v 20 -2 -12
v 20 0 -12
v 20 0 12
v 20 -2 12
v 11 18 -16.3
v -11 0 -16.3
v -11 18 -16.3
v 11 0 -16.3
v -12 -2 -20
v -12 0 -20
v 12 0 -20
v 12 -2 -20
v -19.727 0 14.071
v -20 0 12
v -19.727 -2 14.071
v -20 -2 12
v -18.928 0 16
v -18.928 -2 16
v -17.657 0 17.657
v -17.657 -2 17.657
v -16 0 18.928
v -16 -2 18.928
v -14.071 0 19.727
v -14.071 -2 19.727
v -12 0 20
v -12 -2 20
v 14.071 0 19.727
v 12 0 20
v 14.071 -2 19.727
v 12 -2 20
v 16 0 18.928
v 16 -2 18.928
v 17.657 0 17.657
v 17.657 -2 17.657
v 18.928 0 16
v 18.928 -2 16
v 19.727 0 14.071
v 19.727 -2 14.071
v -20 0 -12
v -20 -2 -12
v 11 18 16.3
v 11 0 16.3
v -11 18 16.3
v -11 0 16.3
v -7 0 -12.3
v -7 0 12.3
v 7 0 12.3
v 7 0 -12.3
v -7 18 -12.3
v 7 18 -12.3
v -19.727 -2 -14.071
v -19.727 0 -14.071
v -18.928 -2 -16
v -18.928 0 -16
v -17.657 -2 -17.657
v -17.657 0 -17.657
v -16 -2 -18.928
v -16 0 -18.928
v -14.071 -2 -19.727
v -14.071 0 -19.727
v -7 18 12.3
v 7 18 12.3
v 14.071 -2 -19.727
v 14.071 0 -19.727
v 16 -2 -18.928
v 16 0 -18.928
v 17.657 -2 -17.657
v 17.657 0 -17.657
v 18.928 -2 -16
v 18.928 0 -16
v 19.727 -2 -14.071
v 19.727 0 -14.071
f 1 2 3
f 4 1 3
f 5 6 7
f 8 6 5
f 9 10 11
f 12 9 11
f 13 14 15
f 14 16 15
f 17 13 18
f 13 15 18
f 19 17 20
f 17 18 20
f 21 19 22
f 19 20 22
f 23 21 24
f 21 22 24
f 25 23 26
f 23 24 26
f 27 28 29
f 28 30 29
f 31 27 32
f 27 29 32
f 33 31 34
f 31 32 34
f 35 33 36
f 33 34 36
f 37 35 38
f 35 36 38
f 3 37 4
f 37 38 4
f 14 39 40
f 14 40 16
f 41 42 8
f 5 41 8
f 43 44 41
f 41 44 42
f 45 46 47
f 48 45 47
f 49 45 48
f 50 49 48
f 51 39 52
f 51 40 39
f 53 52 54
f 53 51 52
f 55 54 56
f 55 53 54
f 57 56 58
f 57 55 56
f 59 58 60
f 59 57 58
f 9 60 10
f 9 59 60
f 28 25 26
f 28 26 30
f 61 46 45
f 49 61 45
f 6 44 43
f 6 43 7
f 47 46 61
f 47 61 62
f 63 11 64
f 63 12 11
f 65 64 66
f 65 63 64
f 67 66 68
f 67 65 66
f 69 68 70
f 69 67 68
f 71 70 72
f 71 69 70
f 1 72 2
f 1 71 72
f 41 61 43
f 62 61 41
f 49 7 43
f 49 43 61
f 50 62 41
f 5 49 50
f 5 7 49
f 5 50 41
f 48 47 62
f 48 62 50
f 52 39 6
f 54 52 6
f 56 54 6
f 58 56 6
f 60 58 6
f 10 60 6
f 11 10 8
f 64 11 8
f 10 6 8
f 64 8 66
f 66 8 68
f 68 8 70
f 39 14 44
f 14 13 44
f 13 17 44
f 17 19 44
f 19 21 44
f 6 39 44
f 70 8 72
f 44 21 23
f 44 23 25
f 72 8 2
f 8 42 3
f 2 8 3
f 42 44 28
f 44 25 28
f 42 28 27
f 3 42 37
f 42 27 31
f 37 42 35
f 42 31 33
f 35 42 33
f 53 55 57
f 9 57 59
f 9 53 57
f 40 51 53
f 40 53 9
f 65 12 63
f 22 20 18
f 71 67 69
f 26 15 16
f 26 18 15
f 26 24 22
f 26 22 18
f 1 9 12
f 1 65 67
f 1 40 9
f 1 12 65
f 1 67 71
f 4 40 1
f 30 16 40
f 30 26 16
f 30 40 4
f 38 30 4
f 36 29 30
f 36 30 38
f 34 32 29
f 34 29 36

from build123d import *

# Parameters (mm, degrees)
SKETCH1_W           = 22
SKETCH1_H           = 32.6
SKETCH1_W_2         = 14
SKETCH1_H_2         = 24.6
BOSS_EXTRUDE1_DEPTH = 18
SKETCH3_W           = 40
SKETCH3_H           = 40
BOSS_EXTRUDE2_DEPTH = 2
FILLET1_R           = 8


with BuildPart() as part:
    # Sketch1 → Boss-Extrude1 (new body)
    with BuildSketch(Plane(origin=(0, 0, 0), x_dir=(1, 0, 0), z_dir=(0, 1, 0))):
        Rectangle(SKETCH1_W, SKETCH1_H)
        Rectangle(SKETCH1_W_2, SKETCH1_H_2, mode=Mode.SUBTRACT)
    extrude(amount=BOSS_EXTRUDE1_DEPTH)

    # Sketch3 → Boss-Extrude2 (add)
    with BuildSketch(Plane.XZ):
        Rectangle(SKETCH3_W, SKETCH3_H)
    extrude(amount=BOSS_EXTRUDE2_DEPTH)

    # Fillet1
    fillet1_edges = [part.edges().sort_by_distance(p)[0] for p in [
        (20, -1, -20),
        (20, -1, 20),
        (-20, -1, 20),
        (-20, -1, -20),
    ]]
    fillet(fillet1_edges, radius=FILLET1_R)


solid = part.part
